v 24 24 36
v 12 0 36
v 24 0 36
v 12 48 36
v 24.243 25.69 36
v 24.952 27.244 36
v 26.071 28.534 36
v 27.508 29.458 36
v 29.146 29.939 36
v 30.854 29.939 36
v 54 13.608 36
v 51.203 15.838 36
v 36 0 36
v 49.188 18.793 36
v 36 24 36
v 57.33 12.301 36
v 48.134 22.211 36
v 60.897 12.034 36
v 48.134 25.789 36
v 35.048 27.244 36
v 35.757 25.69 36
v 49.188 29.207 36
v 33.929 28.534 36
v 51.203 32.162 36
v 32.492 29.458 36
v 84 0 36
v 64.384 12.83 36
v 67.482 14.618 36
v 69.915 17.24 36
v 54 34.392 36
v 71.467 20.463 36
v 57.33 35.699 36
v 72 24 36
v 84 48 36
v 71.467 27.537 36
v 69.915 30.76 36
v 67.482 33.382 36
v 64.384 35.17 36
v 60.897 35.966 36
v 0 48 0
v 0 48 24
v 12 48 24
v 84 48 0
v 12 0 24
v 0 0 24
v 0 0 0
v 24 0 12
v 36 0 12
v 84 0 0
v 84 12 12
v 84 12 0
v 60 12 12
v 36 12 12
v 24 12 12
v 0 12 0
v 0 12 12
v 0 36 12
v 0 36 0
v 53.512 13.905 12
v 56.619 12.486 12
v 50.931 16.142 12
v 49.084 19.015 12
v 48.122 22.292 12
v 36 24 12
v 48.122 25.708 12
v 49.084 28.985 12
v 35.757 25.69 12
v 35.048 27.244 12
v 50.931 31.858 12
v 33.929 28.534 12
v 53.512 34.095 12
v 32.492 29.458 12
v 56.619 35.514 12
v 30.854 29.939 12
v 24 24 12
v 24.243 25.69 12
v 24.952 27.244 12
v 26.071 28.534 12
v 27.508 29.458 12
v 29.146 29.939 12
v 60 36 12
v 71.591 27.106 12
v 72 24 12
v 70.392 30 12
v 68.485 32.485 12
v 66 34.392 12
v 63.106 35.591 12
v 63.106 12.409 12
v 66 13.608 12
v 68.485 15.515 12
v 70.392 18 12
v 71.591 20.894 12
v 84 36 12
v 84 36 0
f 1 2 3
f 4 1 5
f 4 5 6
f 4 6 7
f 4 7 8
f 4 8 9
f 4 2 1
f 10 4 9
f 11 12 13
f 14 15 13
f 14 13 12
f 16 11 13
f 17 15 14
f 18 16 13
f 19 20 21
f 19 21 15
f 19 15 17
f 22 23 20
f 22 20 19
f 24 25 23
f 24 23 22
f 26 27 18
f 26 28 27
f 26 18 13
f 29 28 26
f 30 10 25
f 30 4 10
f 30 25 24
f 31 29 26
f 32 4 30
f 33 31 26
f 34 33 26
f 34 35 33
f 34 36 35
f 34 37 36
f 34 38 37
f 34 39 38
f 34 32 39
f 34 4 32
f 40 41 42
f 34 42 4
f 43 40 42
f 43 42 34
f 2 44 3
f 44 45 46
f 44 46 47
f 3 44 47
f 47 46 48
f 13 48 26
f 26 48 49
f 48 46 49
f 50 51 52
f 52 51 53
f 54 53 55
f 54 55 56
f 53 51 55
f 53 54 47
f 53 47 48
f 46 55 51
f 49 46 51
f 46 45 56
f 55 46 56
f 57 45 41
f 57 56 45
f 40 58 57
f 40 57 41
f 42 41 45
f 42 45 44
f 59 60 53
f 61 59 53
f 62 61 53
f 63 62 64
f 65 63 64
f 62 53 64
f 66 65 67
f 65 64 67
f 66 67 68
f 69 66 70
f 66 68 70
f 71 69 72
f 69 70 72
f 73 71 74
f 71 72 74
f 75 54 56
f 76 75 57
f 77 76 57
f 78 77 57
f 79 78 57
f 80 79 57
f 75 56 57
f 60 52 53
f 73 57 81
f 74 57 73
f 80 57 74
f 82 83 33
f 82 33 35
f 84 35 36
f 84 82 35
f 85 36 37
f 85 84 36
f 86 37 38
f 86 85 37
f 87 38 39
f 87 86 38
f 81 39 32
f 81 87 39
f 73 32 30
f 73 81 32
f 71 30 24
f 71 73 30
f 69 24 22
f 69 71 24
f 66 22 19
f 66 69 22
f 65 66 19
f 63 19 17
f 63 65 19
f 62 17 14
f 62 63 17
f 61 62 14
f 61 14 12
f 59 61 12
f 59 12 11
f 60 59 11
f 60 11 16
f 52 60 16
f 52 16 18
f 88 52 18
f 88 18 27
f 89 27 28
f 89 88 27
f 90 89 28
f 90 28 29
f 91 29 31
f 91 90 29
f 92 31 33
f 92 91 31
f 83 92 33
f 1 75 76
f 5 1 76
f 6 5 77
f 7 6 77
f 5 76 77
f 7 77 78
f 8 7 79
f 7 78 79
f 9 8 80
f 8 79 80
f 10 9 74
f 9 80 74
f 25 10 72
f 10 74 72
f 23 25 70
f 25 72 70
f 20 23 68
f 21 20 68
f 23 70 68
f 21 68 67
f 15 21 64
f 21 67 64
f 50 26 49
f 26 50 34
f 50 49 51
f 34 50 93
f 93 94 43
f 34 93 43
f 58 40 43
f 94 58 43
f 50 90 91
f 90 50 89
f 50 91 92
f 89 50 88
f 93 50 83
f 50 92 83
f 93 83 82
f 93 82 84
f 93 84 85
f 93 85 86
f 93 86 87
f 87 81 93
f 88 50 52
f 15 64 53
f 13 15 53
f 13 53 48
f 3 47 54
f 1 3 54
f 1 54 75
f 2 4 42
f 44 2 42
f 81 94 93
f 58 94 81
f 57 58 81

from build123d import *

# Parameters (mm, degrees)
SKETCH1_W           = 84
SKETCH1_H           = 48
SKETCH1_R           = 12
BOSS_EXTRUDE1_DEPTH = 36
SKETCH2_W           = 12
SKETCH2_H           = 12
CUT_EXTRUDE1_DEPTH  = 49
SKETCH3_W           = 12
SKETCH3_H           = 24
CUT_EXTRUDE2_DEPTH  = 85
SKETCH5_W           = 12
SKETCH5_H           = 12
CUT_EXTRUDE4_DEPTH  = 24


with BuildPart() as part:
    # Sketch1 → Boss-Extrude1 (new body)
    with BuildSketch(Plane.XY):
        with Locations((42, 24)):
            Rectangle(SKETCH1_W, SKETCH1_H)
        with BuildLine():
            Line((36, 24), (36, 12))
            Line((36, 12), (24, 12))
            Line((24, 12), (24, 24))
            ThreePointArc((24, 24), (30, 30.000000202), (36, 24))
        make_face(mode=Mode.SUBTRACT)
        with Locations((60, 24)):
            Circle(SKETCH1_R, mode=Mode.SUBTRACT)
    extrude(amount=BOSS_EXTRUDE1_DEPTH)

    # Sketch2 → Cut-Extrude1 (cut, through all)
    with BuildSketch(Plane(origin=(0, 48, 0), x_dir=(1, 0, 0), z_dir=(0, 1, 0))):
        with Locations((6, -30)):
            Rectangle(SKETCH2_W, SKETCH2_H)
    extrude(amount=-CUT_EXTRUDE1_DEPTH, mode=Mode.SUBTRACT)

    # Sketch3 → Cut-Extrude2 (cut, through all)
    with BuildSketch(Plane.ZY):
        with Locations((6, 24)):
            Rectangle(SKETCH3_W, SKETCH3_H)
    extrude(amount=-CUT_EXTRUDE2_DEPTH, mode=Mode.SUBTRACT)

    # Sketch5 → Cut-Extrude4 (cut)
    with BuildSketch(Plane.XY.offset(36)):
        with Locations((30, 6)):
            Rectangle(SKETCH5_W, SKETCH5_H)
    extrude(amount=-CUT_EXTRUDE4_DEPTH, mode=Mode.SUBTRACT)


solid = part.part
